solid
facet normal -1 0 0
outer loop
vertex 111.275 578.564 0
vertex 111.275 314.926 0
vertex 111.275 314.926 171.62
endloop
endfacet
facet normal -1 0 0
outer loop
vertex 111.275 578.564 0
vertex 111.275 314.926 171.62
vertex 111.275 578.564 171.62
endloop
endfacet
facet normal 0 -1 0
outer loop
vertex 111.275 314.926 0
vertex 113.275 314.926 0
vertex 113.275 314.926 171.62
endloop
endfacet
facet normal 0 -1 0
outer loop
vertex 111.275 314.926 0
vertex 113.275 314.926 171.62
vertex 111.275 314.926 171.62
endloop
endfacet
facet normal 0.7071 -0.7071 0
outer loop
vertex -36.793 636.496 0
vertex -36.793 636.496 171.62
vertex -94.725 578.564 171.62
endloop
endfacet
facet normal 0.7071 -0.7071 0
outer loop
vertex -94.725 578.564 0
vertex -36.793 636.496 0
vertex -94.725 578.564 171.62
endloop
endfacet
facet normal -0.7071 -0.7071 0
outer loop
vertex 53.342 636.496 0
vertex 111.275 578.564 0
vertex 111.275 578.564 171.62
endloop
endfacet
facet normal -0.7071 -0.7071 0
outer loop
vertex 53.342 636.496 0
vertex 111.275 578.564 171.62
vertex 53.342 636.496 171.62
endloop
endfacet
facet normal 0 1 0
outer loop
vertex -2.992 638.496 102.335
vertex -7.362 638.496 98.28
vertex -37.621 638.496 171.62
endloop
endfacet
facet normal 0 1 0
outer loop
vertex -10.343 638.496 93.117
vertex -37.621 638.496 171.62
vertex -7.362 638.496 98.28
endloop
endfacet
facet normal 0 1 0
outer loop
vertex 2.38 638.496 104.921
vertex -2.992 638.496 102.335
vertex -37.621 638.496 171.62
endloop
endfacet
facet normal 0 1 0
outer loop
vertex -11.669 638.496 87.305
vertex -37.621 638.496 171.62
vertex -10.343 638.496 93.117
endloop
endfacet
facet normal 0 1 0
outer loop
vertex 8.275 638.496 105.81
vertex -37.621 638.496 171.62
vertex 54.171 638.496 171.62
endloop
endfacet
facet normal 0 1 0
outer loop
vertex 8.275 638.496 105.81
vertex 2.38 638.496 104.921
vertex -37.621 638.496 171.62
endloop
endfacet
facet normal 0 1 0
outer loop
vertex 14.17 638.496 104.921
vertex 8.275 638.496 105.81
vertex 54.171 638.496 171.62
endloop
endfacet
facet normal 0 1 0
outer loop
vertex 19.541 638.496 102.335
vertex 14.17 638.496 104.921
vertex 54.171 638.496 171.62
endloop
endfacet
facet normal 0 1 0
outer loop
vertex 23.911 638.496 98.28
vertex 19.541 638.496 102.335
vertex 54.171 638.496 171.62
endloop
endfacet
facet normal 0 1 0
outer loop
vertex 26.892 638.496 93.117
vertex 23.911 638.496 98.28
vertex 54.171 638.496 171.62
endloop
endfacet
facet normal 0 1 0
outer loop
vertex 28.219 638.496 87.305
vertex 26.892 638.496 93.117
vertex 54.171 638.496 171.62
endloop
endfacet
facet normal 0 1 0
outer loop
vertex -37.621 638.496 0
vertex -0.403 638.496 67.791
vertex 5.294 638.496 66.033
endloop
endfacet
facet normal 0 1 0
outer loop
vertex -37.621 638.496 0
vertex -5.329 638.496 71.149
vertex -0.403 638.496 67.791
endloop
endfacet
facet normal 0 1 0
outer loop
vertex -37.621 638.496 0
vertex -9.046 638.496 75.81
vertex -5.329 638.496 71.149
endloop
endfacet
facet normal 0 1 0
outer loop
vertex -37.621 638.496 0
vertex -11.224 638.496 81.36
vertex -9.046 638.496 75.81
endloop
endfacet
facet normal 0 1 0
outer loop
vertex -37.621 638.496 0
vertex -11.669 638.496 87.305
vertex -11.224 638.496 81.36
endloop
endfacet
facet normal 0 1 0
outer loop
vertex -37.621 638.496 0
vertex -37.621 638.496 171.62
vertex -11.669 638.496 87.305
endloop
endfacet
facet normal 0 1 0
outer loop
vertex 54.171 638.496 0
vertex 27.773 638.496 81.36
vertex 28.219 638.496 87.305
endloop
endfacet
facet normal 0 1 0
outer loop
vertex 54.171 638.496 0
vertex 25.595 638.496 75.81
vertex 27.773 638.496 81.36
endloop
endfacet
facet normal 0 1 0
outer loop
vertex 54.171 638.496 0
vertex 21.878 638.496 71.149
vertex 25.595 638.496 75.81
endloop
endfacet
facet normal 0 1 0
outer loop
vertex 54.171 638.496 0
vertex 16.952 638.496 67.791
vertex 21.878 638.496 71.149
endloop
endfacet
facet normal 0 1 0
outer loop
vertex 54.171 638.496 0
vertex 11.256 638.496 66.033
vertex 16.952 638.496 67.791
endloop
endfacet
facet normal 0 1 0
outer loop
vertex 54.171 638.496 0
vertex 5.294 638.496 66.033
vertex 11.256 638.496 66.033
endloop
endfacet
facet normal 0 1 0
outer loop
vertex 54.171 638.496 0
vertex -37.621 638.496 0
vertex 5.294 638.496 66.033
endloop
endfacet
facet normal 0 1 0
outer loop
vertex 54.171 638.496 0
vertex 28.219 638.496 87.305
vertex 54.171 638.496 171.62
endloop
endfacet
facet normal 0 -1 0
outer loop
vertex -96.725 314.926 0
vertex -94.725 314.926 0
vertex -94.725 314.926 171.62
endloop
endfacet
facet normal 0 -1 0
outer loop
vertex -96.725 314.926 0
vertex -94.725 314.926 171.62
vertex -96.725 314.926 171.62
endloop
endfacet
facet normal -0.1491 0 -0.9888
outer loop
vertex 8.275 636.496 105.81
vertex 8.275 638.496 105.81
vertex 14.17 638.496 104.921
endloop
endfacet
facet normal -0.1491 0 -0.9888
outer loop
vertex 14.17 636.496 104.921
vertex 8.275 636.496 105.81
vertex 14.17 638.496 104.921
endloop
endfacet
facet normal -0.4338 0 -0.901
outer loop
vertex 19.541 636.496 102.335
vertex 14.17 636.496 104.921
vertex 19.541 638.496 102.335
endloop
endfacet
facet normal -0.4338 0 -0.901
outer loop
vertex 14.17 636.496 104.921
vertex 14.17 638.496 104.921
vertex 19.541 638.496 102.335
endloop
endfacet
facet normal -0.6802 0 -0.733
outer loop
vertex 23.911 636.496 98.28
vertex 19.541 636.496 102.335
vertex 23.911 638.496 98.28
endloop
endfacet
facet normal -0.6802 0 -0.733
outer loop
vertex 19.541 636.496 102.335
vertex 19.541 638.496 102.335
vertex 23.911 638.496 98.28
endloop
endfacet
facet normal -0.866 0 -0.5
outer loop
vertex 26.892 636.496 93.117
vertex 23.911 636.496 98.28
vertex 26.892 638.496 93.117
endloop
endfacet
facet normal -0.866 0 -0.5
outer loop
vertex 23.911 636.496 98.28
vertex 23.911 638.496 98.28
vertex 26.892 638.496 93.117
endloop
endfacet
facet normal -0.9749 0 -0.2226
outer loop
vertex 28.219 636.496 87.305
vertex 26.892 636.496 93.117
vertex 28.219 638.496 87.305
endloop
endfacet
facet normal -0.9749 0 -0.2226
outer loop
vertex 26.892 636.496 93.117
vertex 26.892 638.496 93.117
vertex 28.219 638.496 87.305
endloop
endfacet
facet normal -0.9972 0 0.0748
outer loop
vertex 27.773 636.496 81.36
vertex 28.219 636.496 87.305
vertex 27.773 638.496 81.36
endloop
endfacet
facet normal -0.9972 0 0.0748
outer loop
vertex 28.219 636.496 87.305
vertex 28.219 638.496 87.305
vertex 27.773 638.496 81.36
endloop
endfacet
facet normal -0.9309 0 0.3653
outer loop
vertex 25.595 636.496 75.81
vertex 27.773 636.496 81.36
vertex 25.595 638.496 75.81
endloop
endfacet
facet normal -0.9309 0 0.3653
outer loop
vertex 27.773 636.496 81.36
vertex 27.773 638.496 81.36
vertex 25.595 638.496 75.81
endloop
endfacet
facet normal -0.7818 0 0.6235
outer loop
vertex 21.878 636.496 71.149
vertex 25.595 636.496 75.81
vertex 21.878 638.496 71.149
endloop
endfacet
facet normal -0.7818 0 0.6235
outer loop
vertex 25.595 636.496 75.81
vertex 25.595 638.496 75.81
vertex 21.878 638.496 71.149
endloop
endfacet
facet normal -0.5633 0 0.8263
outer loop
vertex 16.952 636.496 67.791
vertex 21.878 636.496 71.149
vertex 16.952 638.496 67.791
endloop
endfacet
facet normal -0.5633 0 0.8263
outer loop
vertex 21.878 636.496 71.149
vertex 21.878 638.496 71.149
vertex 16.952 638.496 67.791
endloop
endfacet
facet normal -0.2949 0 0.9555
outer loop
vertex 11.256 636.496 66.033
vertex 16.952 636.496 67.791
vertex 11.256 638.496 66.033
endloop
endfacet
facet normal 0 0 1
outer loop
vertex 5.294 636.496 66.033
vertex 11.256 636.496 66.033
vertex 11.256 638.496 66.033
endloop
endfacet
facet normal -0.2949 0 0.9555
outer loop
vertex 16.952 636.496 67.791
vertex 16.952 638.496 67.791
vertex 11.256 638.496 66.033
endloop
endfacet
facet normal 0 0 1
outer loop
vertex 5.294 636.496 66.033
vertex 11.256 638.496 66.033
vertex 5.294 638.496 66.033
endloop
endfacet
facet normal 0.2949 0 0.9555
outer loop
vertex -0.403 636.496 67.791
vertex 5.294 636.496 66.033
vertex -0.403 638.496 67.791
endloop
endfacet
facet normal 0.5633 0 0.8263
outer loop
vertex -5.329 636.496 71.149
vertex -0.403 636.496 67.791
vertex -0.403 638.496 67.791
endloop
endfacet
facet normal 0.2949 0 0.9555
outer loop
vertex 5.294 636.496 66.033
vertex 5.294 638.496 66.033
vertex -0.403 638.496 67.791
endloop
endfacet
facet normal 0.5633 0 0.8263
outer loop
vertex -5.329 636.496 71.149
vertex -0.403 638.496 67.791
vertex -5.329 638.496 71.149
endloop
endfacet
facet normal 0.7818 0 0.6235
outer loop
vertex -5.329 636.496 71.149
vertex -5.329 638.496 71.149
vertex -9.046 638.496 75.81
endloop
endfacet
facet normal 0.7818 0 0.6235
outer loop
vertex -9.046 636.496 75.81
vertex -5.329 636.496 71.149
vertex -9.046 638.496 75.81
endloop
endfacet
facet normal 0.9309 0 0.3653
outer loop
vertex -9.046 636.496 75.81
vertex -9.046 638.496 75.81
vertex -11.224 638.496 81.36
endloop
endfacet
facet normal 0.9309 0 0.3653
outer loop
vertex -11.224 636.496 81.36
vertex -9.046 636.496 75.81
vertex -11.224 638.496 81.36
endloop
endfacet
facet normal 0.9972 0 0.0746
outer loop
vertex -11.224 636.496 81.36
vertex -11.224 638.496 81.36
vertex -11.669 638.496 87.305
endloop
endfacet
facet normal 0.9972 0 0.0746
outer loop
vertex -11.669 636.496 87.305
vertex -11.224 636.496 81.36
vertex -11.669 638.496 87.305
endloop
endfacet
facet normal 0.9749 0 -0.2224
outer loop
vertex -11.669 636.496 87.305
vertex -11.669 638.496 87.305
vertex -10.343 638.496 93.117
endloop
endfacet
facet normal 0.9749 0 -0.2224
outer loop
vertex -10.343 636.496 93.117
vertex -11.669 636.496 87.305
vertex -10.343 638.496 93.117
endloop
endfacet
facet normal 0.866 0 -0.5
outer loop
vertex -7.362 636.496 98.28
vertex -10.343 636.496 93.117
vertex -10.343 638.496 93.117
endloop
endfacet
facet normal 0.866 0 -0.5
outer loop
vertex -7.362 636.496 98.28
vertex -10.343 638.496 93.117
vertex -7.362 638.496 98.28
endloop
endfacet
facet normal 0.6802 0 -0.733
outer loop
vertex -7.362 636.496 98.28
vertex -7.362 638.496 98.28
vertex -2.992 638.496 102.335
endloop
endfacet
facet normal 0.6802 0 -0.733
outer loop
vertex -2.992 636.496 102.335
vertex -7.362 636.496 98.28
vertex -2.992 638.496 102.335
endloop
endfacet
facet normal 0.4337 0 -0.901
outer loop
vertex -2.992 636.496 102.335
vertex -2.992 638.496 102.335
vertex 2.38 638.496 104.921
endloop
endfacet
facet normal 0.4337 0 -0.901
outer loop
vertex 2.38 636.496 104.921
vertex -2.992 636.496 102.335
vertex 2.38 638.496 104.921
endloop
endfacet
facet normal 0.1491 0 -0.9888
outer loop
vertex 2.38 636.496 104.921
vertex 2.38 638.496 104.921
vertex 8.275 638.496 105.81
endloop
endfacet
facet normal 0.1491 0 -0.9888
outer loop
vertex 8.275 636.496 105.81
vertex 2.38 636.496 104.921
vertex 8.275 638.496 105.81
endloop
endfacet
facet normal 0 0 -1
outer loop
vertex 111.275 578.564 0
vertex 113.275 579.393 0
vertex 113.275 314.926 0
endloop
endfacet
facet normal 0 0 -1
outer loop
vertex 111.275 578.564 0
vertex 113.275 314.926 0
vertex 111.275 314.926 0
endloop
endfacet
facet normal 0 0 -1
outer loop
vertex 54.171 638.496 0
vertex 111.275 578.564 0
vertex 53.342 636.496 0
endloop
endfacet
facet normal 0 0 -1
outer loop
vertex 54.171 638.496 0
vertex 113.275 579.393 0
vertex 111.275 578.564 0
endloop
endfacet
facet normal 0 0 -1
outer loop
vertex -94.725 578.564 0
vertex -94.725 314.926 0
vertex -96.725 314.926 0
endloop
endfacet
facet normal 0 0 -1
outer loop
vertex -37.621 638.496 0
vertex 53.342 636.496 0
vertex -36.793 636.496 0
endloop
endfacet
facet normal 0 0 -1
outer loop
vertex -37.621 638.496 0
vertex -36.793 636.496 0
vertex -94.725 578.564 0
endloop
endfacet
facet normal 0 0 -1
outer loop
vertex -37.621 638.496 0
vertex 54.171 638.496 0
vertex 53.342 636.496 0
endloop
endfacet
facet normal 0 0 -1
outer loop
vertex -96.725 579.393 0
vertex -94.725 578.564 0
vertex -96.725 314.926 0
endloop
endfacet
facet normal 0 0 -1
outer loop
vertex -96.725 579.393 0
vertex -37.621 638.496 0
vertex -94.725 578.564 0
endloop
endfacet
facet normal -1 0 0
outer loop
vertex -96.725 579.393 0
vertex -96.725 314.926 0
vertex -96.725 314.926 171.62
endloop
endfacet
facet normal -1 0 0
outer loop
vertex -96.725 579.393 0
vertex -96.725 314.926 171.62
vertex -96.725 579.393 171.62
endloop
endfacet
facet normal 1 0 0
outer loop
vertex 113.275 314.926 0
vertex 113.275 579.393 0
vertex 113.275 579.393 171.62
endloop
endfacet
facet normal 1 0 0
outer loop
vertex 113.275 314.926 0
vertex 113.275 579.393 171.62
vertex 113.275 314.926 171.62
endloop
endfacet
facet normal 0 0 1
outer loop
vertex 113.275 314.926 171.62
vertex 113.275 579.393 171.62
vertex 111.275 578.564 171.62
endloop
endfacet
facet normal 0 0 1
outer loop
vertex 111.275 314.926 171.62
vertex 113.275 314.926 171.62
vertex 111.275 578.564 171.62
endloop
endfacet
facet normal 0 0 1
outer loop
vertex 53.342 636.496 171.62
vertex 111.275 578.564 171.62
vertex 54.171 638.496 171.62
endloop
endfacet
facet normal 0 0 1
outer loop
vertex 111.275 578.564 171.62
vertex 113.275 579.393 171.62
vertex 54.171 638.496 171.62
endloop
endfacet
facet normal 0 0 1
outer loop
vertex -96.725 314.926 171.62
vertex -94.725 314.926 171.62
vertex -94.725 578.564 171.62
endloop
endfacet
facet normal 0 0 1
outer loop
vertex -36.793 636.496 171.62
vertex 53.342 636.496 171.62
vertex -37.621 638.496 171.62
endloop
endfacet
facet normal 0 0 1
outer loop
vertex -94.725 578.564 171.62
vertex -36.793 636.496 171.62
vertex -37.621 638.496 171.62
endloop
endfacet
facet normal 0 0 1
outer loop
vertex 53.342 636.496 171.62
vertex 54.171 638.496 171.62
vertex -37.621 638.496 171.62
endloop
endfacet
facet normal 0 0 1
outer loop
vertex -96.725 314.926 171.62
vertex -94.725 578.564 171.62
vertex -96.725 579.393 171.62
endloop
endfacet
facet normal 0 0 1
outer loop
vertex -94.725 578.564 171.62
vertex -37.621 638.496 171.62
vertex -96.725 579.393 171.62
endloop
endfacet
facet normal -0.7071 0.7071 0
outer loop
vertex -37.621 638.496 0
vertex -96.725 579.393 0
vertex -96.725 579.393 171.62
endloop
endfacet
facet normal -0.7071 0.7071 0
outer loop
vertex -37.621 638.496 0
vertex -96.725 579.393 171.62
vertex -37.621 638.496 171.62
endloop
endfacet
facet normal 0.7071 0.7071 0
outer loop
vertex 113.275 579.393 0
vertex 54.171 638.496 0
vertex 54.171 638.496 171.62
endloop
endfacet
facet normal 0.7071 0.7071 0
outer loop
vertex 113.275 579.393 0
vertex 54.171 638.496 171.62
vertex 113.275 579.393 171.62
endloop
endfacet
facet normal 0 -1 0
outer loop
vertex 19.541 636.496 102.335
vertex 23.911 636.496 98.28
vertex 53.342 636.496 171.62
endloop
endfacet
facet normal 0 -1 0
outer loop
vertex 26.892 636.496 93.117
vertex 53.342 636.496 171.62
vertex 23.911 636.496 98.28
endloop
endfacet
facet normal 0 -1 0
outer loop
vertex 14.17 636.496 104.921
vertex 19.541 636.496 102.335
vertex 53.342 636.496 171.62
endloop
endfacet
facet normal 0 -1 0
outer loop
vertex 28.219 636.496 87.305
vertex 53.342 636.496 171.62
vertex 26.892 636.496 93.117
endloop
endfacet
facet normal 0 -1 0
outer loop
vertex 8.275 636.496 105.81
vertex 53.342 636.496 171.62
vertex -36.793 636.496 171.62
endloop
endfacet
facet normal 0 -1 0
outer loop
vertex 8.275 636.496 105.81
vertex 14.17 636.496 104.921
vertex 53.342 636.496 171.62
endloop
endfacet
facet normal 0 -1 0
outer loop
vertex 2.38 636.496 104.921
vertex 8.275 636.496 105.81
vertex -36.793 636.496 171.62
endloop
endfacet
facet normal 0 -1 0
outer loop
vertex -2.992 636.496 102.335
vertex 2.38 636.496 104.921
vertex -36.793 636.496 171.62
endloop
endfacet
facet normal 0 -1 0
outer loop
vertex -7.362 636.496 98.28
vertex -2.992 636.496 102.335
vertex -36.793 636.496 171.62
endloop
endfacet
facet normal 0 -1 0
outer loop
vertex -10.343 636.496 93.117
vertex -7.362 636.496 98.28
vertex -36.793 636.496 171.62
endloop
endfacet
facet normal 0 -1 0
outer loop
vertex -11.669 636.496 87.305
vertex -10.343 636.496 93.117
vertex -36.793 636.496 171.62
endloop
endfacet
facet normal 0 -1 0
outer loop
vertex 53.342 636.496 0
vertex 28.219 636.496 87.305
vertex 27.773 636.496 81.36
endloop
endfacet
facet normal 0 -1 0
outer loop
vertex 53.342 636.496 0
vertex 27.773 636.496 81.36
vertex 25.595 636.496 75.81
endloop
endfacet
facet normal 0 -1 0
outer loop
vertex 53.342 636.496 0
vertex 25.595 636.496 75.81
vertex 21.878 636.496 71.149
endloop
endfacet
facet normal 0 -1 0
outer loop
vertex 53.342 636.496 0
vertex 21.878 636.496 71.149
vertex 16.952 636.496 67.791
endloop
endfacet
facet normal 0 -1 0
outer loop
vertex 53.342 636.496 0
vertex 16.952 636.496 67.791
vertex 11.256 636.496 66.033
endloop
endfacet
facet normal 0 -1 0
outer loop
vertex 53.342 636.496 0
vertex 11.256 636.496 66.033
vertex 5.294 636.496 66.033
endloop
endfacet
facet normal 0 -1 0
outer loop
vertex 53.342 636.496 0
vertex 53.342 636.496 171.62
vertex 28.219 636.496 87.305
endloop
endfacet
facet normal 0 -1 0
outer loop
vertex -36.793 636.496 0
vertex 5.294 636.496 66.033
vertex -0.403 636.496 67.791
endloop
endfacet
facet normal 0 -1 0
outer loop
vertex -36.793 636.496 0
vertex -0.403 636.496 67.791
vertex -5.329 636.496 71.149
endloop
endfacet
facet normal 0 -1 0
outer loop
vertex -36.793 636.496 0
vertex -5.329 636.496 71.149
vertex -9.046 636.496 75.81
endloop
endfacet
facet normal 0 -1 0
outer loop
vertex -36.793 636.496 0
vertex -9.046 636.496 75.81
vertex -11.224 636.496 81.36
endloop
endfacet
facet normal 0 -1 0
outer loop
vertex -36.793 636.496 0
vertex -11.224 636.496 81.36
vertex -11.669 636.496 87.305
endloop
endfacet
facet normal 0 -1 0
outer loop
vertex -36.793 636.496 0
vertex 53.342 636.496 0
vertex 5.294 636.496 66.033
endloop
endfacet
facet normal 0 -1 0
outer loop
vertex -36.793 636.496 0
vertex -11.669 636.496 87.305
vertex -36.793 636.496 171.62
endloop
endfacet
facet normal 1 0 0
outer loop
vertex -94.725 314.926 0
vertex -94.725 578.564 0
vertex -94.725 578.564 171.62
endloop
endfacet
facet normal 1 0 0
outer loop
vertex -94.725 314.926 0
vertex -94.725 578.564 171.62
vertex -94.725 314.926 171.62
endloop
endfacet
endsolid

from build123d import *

# Parameters (mm, degrees)
EXTRUDE_1_DEPTH     = 171.62
SKETCH_2_R          = 20
CUT_EXTRUDE_1_DEPTH = 384.382537519


with BuildPart() as part:
    # Эскиз1 → Вытянуть-Тонкостенный1 (new body)
    with BuildSketch(Plane.XY):
        Polygon((-96.72523491, 314.926453532), (-96.72523491, 579.392619017), (-37.621355545, 638.496497272), (54.170886835, 638.496497272), (113.274765367, 579.39261874), (113.27476147, 314.926454672), (111.27476147, 314.926454702), (111.274765355, 578.564191627), (53.34245971, 636.496497272), (-36.792928431, 636.496497272), (-94.72523491, 578.564191882), (-94.72523491, 314.926453532), align=None)
    extrude(amount=EXTRUDE_1_DEPTH)

    # Эскиз2 → Вырез-Вытянуть1 (cut, through all)
    with BuildSketch(Plane(origin=(0, 638.496497272, 0), x_dir=(1, 0, 0), z_dir=(0, 1, 0))):
        with Locations(Location((8.274765645, -85.81, 0), (0, 0, 270))):
            Circle(SKETCH_2_R)
    extrude(amount=-CUT_EXTRUDE_1_DEPTH, mode=Mode.SUBTRACT)


solid = part.part
